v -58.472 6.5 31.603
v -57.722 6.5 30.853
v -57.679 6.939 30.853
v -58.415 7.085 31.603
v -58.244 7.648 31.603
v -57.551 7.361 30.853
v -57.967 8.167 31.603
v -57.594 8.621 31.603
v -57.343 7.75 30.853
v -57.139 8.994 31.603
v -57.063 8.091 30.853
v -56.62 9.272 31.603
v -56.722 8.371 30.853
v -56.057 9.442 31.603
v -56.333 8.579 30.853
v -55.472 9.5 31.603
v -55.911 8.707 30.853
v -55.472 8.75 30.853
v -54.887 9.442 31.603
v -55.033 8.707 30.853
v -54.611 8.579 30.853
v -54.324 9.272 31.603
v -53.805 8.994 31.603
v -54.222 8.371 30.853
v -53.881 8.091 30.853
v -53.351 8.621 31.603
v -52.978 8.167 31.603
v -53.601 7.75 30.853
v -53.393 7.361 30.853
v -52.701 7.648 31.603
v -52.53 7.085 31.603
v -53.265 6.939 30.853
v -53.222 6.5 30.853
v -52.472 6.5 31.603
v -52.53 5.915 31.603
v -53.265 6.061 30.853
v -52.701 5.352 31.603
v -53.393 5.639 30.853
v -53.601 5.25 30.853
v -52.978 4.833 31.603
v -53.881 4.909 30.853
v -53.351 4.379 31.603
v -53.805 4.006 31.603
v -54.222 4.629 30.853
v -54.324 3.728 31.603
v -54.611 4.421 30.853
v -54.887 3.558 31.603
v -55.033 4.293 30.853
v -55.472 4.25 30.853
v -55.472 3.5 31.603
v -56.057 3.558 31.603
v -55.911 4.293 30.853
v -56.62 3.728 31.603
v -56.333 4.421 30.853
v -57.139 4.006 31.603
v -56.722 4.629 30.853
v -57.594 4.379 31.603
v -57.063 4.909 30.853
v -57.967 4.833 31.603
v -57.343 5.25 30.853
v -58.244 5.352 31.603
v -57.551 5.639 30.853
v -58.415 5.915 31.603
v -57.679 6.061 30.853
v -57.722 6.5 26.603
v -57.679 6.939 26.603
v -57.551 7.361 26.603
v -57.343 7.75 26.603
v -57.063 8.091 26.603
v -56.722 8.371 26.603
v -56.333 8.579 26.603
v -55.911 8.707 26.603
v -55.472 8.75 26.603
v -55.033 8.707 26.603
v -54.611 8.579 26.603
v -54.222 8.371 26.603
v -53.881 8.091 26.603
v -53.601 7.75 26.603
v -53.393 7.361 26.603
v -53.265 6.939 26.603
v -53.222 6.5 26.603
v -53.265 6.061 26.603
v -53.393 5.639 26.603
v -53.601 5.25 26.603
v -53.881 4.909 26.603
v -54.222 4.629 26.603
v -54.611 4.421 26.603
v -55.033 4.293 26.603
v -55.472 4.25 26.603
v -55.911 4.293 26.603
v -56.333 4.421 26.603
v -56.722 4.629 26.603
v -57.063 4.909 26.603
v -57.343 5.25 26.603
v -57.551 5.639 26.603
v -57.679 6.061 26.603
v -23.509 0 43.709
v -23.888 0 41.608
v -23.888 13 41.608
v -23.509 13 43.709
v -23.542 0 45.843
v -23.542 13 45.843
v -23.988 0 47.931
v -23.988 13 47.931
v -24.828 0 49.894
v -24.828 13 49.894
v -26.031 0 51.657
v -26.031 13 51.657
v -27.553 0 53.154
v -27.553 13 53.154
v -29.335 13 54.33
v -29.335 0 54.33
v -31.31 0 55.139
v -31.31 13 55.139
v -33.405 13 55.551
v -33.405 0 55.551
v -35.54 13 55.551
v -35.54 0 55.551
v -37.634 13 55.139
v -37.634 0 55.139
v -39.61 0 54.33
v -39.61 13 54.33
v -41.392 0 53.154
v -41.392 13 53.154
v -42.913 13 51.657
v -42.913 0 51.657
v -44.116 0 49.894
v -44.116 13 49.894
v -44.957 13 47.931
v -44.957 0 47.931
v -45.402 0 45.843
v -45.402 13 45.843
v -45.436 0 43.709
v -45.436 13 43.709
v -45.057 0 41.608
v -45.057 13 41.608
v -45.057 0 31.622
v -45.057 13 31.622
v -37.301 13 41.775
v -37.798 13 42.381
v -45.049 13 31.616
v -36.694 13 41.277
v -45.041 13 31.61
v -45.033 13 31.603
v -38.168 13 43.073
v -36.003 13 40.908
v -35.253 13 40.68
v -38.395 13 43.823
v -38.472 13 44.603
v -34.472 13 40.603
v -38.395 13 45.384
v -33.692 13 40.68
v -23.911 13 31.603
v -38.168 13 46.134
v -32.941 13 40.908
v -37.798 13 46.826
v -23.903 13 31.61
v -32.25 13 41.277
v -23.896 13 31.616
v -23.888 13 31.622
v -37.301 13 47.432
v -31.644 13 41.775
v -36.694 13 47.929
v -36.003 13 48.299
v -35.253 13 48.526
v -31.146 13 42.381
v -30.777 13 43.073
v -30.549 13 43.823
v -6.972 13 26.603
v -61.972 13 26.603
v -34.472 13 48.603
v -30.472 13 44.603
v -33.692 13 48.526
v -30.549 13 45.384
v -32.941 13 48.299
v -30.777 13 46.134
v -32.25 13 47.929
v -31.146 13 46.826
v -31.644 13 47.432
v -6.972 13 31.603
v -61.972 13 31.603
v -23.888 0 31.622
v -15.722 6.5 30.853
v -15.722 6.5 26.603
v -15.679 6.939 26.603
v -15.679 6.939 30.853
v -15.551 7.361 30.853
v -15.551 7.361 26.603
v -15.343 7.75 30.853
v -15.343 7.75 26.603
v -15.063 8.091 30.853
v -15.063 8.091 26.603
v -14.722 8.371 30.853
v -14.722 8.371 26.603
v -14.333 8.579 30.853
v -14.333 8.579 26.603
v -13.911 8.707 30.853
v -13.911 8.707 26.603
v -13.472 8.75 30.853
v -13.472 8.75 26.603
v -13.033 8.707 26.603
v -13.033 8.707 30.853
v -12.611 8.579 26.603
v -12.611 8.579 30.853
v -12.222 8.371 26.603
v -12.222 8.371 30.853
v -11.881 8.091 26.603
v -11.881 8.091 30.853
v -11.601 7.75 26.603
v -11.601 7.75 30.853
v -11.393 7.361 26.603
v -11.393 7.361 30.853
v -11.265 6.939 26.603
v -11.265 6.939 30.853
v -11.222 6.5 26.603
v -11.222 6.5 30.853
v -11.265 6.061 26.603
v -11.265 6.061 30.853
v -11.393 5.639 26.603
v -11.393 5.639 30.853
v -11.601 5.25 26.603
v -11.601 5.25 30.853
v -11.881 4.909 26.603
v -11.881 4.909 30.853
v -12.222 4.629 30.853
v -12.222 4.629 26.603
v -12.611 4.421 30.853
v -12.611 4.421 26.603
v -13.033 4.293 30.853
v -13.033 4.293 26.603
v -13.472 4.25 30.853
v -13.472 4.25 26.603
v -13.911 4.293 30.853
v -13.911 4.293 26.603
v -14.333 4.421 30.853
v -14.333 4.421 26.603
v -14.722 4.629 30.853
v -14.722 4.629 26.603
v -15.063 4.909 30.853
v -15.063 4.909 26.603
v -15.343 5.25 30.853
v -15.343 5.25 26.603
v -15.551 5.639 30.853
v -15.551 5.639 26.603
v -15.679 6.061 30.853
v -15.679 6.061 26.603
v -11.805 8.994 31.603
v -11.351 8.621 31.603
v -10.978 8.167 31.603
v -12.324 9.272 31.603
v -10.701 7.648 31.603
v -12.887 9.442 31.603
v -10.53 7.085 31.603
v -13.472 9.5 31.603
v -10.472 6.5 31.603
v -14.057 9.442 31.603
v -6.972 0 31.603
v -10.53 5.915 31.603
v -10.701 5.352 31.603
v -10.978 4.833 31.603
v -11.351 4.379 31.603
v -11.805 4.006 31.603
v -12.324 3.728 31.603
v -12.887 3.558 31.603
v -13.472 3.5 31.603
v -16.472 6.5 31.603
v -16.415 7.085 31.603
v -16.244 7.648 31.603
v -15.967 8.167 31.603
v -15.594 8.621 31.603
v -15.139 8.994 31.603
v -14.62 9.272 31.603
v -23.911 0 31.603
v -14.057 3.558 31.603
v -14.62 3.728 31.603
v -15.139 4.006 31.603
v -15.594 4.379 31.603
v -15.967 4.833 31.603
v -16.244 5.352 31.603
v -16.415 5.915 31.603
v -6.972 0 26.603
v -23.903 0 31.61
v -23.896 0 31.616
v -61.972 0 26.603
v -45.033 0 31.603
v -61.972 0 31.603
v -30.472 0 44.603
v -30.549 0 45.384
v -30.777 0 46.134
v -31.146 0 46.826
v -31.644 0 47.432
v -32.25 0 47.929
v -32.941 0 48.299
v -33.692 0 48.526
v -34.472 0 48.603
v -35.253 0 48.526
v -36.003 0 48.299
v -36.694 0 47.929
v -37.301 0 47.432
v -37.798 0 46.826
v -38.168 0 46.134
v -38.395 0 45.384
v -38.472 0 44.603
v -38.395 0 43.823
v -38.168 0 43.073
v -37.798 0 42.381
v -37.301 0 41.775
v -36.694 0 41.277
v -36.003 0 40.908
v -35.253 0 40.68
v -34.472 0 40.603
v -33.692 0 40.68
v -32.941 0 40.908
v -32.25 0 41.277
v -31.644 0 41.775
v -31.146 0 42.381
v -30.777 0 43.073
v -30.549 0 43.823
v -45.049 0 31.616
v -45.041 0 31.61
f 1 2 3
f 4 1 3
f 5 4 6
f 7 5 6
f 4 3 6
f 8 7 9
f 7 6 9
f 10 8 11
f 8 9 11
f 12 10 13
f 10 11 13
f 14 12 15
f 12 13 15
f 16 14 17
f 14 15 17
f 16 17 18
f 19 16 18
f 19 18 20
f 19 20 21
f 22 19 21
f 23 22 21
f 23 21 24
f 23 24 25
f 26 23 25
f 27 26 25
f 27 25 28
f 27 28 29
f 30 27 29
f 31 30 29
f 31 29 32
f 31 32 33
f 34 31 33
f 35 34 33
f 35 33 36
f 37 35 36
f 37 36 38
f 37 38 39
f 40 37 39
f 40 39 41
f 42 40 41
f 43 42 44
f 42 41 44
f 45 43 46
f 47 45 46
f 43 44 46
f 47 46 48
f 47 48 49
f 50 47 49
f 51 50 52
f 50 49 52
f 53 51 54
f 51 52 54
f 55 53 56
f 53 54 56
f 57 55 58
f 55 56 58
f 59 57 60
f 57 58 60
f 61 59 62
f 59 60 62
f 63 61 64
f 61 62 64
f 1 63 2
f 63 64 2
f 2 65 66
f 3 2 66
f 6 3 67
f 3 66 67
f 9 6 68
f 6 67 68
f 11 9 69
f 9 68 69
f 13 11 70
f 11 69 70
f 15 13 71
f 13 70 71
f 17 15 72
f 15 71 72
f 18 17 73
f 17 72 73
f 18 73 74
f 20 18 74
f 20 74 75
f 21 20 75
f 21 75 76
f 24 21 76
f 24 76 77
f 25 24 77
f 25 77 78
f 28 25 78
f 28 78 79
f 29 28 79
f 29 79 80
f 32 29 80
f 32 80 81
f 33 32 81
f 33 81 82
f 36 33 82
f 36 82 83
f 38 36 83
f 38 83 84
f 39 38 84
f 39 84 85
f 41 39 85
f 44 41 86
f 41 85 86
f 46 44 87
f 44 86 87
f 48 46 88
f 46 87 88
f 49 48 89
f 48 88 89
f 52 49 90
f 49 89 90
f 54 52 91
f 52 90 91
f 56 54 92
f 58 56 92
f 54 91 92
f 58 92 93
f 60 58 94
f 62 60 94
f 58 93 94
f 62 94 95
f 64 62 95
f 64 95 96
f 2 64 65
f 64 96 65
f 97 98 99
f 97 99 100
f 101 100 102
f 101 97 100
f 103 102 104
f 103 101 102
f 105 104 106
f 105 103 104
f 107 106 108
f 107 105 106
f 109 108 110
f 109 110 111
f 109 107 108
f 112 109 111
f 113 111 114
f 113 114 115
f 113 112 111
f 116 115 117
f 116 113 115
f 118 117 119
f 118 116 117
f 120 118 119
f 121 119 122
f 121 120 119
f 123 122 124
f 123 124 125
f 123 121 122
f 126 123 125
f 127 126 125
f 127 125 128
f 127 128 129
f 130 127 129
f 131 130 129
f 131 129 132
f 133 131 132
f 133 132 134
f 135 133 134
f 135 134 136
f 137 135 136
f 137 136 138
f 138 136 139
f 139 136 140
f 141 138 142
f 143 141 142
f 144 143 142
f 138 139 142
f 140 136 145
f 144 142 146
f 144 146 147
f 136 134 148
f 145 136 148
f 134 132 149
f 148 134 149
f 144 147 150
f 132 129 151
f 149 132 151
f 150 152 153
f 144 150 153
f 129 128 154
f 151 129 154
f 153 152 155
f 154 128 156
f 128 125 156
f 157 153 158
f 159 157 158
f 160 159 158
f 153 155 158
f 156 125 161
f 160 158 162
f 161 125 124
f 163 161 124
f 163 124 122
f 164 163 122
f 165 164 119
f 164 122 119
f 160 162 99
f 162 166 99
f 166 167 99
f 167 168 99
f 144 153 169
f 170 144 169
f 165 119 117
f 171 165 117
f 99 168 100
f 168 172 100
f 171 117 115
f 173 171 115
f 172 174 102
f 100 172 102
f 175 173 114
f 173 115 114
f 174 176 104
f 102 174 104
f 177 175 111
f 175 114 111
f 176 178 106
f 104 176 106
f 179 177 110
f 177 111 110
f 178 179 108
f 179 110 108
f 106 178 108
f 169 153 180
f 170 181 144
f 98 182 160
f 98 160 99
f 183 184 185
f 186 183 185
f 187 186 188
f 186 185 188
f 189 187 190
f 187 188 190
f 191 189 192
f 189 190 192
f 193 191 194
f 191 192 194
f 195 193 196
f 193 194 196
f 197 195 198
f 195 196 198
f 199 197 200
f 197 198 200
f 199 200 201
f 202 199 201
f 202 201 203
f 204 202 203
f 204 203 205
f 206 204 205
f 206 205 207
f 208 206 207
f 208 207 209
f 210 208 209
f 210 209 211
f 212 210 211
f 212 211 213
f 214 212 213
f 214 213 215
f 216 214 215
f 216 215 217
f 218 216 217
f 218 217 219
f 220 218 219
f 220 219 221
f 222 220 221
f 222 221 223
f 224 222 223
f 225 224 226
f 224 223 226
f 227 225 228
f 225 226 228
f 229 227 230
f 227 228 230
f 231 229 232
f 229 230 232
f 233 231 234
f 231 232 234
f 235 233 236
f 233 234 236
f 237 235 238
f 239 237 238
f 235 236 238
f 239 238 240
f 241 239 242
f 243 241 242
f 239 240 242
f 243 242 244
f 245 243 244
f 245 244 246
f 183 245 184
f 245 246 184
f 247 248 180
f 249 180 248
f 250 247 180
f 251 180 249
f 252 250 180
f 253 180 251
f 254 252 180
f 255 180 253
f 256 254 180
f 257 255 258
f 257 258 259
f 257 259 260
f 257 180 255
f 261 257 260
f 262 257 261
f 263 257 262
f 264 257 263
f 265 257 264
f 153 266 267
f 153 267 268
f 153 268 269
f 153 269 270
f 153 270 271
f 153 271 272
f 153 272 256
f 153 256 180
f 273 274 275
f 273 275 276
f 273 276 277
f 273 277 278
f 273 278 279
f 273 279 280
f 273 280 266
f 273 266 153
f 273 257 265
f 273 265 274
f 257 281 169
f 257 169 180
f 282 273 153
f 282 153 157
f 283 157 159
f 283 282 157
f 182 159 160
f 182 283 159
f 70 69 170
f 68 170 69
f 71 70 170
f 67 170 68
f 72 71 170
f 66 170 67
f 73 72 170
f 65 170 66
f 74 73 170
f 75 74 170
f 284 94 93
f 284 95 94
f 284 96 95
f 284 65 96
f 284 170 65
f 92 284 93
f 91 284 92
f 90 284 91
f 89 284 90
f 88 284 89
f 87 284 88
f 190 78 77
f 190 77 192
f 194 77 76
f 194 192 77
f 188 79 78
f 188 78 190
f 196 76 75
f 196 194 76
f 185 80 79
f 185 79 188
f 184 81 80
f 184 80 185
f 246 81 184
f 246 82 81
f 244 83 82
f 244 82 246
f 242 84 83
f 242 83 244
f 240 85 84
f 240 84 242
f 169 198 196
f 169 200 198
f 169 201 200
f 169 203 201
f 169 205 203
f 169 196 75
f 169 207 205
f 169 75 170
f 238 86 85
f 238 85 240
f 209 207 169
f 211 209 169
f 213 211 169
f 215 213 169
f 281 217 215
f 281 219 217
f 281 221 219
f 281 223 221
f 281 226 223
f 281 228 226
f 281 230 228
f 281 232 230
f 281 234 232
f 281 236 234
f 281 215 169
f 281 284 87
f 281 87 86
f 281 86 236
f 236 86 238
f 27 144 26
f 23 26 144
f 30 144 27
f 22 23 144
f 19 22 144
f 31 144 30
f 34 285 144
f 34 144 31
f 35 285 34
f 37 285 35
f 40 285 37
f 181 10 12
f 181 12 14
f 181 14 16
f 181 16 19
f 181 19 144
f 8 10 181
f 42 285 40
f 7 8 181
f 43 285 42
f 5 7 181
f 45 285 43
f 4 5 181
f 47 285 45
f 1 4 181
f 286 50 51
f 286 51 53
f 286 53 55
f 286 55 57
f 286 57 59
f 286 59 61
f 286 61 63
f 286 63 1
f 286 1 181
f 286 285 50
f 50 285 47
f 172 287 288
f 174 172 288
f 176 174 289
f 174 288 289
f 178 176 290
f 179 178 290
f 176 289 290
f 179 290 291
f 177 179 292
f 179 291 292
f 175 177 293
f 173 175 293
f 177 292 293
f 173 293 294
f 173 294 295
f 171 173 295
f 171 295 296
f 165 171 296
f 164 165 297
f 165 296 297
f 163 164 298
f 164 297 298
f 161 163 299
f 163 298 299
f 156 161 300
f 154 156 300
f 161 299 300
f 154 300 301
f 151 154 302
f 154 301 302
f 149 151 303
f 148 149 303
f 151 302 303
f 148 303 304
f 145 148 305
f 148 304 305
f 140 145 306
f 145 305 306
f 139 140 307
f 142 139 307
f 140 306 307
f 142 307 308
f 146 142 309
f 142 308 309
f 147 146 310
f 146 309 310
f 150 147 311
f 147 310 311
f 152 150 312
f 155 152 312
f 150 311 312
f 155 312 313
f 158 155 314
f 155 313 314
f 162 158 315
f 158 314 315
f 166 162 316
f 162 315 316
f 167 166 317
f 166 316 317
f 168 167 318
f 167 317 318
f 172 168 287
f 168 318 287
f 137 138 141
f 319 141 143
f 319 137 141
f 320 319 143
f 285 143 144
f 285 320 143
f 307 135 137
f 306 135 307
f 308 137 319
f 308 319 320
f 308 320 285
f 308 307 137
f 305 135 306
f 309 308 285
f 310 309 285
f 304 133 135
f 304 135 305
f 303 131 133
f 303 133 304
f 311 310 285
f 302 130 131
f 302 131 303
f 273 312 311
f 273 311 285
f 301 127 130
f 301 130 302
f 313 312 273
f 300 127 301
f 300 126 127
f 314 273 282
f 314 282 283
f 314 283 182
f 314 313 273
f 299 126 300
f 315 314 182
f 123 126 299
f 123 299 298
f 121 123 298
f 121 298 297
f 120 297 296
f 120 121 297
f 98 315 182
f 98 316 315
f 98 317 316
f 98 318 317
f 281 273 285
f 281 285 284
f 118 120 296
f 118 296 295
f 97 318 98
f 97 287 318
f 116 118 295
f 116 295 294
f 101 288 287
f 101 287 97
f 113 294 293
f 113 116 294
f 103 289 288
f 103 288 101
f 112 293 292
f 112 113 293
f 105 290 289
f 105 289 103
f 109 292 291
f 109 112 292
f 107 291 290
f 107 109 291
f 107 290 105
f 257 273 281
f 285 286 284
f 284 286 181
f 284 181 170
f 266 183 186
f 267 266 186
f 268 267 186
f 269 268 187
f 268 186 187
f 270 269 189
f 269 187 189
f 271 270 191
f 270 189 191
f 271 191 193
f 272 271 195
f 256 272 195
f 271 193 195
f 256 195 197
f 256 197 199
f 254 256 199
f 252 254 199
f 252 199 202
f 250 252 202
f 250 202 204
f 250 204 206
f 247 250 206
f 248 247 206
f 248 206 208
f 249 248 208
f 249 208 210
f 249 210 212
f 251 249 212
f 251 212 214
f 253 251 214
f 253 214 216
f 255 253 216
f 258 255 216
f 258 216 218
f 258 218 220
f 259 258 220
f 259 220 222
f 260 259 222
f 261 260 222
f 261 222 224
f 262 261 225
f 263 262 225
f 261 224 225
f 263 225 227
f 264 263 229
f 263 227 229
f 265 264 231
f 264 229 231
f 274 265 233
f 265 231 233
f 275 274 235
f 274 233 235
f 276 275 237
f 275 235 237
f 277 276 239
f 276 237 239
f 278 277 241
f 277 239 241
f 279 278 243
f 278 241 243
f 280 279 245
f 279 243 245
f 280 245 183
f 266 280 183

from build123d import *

# Parameters (mm, degrees)
F0_R           = 4
F1_DEPTH       = 13
F3_D           = 4.5
F3_DEPTH       = 5
F3_CSINK_D     = 6
F3_CSINK_ANGLE = 90


with BuildPart() as f1:
    # F0 (on Front) → F1 (new body)
    with BuildSketch(Plane.XZ):
        with BuildLine():
            Line((-61.972201, 31.603267), (-61.972201, 26.603267))
            Line((-61.972201, 26.603267), (-6.972201, 26.603267))
            Line((-6.972201, 26.603267), (-6.972201, 31.603267))
            Line((-6.972201, 31.603267), (-23.887811, 31.603267))
            Line((-23.887811, 31.603267), (-23.910946, 31.603267))
            ThreePointArc((-23.910946, 31.603267), (-23.899375, 31.612676), (-23.887811, 31.622096))
            Line((-23.887811, 31.622096), (-23.887811, 41.608154))
            ThreePointArc((-23.887811, 41.608154), (-34.472201, 55.603267), (-45.05659, 41.608154))
            Line((-45.05659, 41.608154), (-45.05659, 31.622096))
            ThreePointArc((-45.05659, 31.622096), (-45.045027, 31.612676), (-45.033455, 31.603267))
            Line((-45.033455, 31.603267), (-45.05659, 31.603267))
            Line((-45.05659, 31.603267), (-61.972201, 31.603267))
        make_face()
        with Locations((-34.472201, 44.603267)):
            Circle(F0_R, mode=Mode.SUBTRACT)
    extrude(amount=-F1_DEPTH)

    # F3
    with Locations(Plane.XY.offset(31.603267)):
        with Locations((-55.472201, 6.5), (-13.472201, 6.5)):
            CounterSinkHole(F3_D / 2, F3_CSINK_D / 2, depth=F3_DEPTH, counter_sink_angle=F3_CSINK_ANGLE)


solid = f1.part
